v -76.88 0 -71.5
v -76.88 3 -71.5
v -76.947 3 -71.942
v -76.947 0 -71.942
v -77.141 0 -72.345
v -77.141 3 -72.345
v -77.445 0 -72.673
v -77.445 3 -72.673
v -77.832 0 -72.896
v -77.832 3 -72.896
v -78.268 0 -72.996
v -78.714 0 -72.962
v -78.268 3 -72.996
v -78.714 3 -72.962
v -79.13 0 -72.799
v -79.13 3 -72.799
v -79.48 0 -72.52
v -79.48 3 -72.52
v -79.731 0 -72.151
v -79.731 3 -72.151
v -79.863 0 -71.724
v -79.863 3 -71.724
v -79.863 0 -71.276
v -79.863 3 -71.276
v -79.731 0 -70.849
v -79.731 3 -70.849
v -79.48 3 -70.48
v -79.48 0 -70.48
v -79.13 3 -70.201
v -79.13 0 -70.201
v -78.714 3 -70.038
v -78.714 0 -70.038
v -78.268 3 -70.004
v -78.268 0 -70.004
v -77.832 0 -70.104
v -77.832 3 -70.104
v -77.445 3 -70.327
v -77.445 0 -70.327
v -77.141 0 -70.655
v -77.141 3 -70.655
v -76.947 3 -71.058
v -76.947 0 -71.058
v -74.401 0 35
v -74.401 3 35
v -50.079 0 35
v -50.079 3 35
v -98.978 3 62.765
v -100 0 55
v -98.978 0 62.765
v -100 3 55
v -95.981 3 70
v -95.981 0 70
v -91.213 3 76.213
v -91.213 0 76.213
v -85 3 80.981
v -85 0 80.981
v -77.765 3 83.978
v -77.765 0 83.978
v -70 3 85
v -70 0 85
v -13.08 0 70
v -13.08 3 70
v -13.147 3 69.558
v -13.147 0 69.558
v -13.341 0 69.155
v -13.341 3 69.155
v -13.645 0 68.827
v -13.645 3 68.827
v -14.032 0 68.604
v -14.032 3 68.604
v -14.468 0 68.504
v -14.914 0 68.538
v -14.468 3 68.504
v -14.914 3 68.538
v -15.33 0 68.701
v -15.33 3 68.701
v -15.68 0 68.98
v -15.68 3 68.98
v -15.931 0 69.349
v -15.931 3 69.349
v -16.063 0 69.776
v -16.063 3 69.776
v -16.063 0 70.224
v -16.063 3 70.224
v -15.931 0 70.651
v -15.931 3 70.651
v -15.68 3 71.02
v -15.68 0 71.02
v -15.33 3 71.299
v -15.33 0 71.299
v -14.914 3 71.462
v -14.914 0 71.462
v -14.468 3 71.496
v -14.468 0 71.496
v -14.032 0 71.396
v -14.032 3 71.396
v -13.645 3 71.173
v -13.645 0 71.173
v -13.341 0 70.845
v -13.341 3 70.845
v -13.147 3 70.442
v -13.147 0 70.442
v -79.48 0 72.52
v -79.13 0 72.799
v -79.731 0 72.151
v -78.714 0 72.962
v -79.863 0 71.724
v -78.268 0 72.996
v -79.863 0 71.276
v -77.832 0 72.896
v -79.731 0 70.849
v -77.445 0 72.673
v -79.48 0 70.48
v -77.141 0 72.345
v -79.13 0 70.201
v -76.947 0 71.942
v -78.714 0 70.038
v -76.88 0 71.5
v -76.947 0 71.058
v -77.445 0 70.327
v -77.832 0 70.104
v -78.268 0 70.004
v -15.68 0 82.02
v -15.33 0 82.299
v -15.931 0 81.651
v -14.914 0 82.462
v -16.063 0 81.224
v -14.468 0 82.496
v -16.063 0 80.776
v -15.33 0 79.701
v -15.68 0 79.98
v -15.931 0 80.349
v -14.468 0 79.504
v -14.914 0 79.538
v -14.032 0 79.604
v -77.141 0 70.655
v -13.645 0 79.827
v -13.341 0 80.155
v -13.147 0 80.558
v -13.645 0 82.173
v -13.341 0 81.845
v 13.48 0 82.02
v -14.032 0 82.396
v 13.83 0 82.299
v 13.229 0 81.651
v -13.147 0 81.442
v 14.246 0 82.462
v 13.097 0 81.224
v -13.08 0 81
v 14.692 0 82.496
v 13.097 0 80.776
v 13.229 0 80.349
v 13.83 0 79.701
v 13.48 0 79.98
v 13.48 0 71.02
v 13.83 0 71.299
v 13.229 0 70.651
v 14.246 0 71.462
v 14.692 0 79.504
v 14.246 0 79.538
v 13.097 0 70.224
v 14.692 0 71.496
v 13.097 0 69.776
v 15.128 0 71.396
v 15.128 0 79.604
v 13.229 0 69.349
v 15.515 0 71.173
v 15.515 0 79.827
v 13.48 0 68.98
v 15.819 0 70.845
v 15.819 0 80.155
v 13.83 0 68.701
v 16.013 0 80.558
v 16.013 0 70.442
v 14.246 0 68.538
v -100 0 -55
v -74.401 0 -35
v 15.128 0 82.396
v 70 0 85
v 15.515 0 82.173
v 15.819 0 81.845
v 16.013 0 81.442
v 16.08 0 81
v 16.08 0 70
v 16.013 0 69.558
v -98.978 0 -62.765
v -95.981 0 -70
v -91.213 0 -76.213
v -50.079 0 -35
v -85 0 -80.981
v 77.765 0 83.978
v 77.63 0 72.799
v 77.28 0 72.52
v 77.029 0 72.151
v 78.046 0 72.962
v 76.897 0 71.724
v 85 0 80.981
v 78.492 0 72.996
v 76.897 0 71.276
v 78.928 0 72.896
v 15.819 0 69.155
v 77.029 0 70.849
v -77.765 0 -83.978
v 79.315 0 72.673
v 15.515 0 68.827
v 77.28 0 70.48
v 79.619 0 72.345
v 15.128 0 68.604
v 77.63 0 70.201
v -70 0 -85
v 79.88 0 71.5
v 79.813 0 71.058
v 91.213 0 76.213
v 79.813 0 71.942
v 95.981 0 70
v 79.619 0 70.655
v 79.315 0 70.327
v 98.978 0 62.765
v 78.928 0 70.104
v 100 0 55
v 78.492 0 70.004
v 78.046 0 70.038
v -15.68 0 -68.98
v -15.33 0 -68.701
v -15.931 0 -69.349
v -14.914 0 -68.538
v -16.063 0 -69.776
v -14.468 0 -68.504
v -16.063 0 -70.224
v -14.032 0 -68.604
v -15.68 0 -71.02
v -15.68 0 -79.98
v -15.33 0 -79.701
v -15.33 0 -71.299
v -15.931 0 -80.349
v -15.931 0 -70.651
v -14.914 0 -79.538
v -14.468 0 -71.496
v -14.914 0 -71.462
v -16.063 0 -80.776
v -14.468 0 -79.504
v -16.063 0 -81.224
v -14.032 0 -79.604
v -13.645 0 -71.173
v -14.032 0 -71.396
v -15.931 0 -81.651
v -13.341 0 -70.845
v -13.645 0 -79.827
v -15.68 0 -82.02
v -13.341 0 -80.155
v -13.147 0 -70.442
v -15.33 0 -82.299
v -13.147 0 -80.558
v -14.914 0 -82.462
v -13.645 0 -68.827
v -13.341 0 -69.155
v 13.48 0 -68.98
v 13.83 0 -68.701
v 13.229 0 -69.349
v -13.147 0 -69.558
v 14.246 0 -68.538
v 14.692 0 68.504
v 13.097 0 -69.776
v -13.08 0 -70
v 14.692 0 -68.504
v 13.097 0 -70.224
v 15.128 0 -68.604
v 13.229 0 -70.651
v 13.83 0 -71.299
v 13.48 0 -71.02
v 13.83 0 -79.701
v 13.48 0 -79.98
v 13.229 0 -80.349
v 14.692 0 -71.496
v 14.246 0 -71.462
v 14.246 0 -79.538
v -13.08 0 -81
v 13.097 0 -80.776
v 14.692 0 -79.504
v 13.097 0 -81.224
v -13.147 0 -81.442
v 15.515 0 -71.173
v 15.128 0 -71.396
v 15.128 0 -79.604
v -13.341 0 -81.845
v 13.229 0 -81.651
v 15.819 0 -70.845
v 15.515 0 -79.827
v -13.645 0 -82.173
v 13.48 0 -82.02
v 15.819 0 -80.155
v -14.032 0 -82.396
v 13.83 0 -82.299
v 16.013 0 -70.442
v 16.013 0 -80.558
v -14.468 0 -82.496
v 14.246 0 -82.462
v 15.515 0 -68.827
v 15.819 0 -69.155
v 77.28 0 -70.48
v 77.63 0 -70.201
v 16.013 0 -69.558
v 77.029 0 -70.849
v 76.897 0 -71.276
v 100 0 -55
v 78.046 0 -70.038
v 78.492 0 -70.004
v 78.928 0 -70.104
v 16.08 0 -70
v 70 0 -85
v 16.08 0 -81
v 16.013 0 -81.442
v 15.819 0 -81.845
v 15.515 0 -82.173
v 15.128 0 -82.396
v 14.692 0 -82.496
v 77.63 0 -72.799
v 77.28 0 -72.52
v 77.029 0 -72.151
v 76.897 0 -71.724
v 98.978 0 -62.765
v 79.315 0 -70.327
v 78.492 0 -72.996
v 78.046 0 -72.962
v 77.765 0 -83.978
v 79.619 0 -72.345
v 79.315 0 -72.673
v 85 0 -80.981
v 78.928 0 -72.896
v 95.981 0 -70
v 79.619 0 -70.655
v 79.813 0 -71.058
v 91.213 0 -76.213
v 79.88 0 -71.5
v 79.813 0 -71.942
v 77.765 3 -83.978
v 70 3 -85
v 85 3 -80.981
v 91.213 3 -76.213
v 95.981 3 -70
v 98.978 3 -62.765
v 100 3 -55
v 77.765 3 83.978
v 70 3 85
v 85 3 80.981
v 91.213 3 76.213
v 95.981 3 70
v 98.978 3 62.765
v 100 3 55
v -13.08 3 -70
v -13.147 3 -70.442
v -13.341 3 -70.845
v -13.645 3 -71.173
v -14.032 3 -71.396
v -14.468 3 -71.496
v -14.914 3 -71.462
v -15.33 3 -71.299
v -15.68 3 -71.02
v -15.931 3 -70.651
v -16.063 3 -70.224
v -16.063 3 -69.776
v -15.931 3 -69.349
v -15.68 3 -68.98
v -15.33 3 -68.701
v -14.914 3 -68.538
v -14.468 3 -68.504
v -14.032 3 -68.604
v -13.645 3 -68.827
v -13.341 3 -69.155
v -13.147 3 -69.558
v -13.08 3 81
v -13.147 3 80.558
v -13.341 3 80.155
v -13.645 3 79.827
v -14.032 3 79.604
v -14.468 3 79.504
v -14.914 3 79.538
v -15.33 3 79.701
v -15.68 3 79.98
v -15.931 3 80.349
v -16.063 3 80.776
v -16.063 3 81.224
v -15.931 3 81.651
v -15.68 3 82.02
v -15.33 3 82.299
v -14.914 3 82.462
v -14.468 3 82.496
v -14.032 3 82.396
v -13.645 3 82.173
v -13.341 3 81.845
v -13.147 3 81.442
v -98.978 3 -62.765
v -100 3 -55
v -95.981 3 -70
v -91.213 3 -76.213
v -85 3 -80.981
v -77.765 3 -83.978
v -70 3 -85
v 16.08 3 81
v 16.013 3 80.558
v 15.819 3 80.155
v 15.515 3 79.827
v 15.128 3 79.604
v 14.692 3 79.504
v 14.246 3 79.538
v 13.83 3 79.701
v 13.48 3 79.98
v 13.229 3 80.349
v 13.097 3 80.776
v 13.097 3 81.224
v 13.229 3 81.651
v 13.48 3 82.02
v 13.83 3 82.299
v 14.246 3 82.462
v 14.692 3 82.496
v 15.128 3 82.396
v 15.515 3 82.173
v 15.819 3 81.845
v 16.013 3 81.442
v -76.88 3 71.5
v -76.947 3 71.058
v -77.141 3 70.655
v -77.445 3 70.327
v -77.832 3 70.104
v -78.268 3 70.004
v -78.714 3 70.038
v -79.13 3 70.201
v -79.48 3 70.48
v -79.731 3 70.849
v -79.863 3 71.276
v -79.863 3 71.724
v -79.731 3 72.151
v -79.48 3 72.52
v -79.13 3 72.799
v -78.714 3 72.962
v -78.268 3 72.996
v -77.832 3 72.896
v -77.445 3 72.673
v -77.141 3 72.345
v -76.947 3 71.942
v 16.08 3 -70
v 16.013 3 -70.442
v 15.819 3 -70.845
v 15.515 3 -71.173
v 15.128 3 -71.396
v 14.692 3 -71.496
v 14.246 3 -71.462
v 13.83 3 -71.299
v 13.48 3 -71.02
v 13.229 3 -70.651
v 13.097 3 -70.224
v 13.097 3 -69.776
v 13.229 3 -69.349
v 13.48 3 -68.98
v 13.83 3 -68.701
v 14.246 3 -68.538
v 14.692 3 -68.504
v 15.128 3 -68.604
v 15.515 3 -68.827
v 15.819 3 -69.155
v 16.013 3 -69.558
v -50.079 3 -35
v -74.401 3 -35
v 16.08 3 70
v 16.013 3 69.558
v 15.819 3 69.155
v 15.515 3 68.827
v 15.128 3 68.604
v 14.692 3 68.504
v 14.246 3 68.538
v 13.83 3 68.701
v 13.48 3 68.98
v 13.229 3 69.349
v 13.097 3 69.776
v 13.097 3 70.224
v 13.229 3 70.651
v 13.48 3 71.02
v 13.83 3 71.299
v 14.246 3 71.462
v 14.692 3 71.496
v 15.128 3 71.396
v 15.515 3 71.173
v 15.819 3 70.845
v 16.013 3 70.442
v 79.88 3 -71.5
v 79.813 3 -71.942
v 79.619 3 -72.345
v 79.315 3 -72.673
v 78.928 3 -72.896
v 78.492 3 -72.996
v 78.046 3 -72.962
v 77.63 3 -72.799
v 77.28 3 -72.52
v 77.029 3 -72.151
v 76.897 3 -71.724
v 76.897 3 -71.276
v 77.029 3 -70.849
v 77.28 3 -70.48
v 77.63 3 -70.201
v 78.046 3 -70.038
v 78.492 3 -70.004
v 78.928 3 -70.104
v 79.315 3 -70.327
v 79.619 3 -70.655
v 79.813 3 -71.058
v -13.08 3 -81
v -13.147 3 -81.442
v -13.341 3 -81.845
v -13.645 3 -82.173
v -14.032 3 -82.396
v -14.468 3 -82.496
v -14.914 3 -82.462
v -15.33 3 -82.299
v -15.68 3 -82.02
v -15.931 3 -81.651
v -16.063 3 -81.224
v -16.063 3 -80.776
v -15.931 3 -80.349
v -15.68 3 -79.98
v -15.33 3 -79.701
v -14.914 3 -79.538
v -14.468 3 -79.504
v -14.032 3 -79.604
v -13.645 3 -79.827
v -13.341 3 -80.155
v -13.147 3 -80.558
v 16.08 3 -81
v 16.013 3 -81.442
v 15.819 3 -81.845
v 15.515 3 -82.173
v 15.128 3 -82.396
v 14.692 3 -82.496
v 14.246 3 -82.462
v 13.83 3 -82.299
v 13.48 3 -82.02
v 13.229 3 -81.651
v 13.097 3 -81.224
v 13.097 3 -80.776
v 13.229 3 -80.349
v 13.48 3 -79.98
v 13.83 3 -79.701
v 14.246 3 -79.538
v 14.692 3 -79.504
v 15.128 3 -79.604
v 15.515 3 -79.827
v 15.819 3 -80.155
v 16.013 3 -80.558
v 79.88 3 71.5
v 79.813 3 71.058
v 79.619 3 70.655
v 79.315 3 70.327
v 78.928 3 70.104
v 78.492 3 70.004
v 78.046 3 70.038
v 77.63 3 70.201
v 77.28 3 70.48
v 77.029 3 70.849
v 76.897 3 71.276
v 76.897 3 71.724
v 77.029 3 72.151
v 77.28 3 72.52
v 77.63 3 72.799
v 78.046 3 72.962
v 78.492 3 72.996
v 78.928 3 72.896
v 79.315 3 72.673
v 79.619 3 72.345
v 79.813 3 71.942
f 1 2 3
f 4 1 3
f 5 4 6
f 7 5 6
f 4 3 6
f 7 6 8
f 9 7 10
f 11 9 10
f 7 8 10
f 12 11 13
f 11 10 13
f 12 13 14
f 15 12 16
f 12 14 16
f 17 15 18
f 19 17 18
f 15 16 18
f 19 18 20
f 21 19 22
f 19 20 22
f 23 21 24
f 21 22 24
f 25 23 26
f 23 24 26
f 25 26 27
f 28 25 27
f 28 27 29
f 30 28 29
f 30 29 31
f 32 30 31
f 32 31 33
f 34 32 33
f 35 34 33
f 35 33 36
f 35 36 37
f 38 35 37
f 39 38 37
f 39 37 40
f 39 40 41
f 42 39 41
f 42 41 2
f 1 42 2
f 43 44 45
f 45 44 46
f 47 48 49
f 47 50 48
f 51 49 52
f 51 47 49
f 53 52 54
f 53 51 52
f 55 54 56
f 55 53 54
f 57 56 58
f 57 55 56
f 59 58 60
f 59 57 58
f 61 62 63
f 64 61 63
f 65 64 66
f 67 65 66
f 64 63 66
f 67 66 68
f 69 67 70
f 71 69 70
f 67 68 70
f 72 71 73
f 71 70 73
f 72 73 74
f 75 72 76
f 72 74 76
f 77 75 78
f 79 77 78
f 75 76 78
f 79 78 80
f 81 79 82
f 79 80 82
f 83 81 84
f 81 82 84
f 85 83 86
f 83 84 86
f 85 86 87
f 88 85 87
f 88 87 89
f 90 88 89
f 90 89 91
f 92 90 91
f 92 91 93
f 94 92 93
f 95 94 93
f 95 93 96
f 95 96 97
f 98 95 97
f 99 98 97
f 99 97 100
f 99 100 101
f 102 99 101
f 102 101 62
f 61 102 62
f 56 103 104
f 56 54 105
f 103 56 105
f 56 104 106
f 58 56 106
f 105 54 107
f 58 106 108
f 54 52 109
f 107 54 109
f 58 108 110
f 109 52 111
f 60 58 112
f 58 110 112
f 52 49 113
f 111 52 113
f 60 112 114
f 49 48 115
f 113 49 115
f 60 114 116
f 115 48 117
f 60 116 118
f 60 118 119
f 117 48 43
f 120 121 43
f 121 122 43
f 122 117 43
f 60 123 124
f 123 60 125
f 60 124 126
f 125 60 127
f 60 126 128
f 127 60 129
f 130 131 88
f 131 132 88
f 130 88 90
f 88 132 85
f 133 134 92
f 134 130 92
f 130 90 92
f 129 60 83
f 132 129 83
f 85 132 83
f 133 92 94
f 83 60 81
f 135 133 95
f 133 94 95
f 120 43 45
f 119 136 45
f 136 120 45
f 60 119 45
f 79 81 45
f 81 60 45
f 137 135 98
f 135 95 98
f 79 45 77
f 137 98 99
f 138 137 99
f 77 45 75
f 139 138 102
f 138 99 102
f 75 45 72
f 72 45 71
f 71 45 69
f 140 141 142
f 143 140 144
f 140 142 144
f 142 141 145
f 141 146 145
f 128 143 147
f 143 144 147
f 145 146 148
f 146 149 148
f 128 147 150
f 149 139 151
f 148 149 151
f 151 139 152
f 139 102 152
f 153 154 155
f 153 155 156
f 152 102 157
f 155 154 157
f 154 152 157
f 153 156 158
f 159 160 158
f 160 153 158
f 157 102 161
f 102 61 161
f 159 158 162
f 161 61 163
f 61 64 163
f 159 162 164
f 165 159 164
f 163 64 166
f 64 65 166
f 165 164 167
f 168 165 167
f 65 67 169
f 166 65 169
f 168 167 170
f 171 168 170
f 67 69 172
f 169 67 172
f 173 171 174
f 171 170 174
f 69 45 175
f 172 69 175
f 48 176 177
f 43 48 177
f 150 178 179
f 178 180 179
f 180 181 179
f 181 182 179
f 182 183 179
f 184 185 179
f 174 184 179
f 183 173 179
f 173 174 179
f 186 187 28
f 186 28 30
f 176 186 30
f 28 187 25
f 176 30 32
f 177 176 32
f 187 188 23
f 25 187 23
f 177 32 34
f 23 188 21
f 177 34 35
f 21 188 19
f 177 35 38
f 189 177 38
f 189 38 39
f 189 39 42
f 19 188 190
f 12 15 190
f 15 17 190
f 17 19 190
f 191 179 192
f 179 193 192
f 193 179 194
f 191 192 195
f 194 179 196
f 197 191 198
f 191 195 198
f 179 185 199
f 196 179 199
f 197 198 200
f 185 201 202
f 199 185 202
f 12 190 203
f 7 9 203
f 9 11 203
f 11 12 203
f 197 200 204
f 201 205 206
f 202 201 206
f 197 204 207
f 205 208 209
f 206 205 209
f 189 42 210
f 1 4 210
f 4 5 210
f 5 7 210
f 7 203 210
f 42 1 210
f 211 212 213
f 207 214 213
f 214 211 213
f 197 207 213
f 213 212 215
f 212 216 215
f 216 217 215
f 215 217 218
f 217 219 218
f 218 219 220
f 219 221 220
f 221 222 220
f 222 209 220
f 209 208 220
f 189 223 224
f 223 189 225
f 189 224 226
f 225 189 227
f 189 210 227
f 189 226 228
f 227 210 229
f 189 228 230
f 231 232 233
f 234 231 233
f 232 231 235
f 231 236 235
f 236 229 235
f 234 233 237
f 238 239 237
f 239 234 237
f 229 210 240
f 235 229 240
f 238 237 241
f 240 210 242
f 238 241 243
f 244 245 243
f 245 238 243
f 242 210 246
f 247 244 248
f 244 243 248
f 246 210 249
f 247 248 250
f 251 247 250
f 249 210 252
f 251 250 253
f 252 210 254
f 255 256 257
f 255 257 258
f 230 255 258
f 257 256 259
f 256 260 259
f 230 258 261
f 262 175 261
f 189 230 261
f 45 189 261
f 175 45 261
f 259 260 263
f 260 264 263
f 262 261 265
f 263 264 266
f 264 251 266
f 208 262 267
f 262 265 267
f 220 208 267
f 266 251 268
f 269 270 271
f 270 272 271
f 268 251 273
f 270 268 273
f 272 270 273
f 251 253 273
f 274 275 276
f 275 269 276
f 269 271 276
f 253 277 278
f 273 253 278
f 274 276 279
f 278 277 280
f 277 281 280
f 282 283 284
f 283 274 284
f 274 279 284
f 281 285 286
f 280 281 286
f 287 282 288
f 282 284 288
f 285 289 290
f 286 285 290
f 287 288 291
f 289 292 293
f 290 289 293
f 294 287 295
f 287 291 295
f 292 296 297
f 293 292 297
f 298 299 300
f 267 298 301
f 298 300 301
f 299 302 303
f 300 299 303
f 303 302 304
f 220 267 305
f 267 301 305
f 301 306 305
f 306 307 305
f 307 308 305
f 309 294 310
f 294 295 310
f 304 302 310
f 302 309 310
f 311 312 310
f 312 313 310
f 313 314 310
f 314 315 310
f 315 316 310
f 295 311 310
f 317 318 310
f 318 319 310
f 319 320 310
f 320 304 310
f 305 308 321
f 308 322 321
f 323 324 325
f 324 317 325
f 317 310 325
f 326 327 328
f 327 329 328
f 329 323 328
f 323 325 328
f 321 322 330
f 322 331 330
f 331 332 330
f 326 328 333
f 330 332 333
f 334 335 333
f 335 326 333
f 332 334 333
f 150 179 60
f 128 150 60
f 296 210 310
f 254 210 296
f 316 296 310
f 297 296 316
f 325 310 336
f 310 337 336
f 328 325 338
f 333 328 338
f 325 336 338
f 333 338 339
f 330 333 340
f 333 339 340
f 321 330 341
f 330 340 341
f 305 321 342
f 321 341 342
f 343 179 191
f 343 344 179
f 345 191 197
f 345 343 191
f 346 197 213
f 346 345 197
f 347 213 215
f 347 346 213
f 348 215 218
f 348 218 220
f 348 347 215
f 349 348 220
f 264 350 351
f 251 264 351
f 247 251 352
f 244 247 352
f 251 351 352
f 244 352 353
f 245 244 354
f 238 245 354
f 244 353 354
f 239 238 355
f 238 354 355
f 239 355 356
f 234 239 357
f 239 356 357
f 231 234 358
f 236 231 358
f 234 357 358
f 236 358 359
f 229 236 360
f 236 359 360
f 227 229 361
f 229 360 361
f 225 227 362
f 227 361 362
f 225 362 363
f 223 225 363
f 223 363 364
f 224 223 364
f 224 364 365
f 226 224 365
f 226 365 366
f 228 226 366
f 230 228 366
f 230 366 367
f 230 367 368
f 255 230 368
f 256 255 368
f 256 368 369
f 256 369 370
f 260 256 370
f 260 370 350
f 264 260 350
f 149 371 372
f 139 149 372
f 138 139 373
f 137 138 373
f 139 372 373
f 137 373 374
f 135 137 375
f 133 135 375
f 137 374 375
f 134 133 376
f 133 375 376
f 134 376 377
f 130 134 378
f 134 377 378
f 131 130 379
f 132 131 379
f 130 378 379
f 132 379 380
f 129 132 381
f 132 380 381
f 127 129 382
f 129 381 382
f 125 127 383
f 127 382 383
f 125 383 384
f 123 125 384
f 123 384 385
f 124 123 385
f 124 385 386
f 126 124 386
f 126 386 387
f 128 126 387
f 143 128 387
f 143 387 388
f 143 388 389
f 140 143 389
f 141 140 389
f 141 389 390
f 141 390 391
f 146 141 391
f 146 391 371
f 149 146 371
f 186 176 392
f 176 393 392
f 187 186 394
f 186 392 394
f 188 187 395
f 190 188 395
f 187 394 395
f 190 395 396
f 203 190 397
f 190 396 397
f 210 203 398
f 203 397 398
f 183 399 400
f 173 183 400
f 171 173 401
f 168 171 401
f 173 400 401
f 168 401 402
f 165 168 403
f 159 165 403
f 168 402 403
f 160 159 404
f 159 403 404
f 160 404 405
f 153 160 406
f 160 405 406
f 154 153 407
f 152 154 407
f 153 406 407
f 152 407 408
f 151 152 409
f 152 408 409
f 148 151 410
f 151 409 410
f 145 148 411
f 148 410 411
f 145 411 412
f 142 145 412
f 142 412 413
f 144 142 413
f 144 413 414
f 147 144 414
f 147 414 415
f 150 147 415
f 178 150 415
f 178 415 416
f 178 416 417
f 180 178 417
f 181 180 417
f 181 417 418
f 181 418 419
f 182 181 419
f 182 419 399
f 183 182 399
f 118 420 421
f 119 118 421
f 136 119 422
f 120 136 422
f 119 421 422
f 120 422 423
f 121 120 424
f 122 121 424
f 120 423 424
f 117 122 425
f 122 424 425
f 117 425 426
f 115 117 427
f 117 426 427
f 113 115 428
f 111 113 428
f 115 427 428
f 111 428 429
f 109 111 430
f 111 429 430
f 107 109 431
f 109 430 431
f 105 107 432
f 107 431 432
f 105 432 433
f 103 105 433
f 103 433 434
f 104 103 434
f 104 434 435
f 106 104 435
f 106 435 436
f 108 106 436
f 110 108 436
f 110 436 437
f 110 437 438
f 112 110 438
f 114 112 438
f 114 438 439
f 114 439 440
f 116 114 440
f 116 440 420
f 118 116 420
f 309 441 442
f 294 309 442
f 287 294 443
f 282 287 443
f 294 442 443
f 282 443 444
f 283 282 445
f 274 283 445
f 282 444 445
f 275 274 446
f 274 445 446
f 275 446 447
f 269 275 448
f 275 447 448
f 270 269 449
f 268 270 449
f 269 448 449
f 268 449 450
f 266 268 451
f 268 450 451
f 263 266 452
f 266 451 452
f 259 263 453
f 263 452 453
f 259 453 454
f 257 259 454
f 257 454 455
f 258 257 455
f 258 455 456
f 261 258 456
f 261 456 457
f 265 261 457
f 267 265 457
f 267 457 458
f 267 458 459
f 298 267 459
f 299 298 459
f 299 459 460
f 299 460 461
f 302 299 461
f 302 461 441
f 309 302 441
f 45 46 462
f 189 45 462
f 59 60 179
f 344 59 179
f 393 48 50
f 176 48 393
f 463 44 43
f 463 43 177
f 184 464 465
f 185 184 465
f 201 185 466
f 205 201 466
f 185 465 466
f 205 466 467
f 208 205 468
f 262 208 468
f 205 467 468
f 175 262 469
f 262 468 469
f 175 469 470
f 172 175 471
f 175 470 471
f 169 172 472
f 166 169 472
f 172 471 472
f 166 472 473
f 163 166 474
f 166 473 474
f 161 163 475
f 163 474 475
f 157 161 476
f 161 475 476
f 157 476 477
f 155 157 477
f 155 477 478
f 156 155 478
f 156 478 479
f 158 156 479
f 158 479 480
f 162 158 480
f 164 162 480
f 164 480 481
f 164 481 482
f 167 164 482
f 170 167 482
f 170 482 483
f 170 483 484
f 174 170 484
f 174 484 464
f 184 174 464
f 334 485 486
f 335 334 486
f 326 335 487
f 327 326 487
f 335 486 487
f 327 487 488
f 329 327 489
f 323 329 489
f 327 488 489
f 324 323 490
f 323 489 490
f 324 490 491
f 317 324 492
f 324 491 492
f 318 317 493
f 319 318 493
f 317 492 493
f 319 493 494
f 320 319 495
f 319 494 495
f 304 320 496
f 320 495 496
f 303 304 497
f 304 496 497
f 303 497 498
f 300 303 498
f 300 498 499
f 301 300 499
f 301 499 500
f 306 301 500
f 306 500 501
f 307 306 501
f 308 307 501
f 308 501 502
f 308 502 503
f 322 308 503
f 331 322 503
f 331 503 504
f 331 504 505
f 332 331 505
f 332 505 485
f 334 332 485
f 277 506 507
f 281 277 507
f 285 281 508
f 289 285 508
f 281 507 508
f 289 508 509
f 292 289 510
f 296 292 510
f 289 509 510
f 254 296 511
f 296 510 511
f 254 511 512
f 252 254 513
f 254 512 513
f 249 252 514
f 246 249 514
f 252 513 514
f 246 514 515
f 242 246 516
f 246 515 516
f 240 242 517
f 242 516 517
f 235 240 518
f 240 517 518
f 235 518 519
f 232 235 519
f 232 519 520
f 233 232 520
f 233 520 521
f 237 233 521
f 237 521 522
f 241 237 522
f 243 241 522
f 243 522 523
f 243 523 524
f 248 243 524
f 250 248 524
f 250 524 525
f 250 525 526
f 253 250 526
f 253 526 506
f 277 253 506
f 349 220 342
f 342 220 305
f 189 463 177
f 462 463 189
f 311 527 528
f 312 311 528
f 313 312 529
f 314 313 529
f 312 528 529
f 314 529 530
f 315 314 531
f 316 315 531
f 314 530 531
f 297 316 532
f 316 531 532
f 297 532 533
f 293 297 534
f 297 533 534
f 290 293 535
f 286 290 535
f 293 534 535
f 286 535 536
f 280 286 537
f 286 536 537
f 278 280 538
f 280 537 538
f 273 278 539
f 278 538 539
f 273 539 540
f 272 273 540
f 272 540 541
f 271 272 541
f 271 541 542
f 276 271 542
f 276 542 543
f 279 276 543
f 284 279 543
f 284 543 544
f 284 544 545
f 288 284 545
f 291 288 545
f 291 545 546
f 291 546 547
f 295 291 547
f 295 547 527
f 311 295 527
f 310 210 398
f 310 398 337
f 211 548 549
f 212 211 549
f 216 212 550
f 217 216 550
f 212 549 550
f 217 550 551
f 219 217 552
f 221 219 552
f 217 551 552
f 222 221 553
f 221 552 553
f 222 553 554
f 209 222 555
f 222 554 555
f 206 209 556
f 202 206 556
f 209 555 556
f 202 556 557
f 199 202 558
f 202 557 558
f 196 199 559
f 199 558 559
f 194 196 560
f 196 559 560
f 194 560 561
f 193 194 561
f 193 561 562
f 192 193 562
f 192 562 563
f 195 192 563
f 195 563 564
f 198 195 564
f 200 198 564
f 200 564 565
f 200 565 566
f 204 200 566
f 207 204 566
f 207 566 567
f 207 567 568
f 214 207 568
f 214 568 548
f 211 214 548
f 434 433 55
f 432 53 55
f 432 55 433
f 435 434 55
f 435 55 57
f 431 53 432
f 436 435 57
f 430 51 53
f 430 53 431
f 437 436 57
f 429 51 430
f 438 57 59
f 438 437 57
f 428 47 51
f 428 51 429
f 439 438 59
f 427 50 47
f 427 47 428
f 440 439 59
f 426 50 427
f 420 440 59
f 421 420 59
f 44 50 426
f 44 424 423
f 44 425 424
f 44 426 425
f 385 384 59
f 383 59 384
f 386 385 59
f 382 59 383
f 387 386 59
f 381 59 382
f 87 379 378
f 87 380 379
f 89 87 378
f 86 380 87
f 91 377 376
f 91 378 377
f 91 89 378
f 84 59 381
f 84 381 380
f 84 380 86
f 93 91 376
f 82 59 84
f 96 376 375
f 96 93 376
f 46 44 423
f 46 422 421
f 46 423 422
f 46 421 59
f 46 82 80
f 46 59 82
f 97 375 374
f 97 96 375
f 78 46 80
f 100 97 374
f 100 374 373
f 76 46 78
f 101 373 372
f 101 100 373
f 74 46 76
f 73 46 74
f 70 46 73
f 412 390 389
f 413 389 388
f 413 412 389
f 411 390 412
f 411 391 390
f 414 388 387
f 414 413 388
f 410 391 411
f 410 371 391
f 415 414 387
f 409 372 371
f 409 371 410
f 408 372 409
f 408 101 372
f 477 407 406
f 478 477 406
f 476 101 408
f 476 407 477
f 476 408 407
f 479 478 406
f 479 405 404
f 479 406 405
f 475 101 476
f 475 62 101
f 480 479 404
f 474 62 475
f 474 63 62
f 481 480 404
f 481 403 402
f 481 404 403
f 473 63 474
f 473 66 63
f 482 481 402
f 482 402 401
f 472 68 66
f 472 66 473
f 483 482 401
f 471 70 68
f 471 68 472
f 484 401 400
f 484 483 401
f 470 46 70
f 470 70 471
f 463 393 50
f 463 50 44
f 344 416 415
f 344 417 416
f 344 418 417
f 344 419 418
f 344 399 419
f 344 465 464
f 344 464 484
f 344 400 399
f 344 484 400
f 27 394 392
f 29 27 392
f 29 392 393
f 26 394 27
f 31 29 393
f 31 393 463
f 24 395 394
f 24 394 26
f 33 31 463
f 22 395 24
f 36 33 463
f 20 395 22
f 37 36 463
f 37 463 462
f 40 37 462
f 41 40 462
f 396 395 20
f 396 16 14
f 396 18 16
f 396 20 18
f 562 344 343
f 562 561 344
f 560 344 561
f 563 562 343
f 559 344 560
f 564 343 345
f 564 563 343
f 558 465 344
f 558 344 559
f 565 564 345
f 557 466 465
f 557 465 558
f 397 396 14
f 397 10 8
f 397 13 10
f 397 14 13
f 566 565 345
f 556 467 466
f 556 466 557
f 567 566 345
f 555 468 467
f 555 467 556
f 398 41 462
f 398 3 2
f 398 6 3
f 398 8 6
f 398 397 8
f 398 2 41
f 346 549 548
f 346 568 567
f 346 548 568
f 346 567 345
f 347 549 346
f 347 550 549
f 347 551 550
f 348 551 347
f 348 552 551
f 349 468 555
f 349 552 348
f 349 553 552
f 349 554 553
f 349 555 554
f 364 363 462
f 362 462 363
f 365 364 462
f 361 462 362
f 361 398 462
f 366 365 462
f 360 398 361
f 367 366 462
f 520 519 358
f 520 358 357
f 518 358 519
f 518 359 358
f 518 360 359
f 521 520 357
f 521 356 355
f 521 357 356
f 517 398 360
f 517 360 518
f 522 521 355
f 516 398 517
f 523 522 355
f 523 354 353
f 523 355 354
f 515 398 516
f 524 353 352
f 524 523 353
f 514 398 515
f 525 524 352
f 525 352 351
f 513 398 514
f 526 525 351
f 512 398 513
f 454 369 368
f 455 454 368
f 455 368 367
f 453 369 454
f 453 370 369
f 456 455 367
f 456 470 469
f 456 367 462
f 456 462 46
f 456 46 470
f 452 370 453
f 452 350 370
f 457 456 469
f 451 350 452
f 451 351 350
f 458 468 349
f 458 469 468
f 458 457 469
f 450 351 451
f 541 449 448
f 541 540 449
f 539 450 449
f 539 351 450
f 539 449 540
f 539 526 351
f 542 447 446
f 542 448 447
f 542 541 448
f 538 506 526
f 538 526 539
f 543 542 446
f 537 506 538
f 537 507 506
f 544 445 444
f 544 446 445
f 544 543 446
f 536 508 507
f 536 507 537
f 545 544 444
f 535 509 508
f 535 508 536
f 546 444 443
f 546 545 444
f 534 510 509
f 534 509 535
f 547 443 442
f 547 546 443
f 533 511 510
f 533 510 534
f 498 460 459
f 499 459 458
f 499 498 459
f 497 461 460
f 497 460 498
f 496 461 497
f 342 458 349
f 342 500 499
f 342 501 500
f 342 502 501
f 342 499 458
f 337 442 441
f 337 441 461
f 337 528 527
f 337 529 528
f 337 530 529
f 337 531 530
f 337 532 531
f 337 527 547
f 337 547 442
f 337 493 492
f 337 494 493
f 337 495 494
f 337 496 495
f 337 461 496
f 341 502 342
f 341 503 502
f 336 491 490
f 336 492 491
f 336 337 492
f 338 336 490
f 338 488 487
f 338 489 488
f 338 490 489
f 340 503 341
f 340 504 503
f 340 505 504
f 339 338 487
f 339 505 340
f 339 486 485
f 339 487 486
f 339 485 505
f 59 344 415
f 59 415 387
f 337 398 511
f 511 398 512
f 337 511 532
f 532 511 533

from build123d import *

# Parameters (mm, degrees)
SKETCH1_W           = 200
SKETCH1_H           = 170
BOSS_EXTRUDE1_DEPTH = 3
SKETCH2_W           = 24.321835298
SKETCH2_H           = 70
CUT_EXTRUDE1_DEPTH  = 100
SKETCH3_R           = 1.5
CUT_EXTRUDE2_DEPTH  = 100
SKETCH4_R           = 1.5
CUT_EXTRUDE3_DEPTH  = 100
FILLET1_R           = 30


with BuildPart() as part:
    # Sketch1 → Boss-Extrude1 (new body)
    with BuildSketch(Plane(origin=(0, 0, 0), x_dir=(1, 0, 0), z_dir=(0, 1, 0))):
        Rectangle(SKETCH1_W, SKETCH1_H)
    extrude(amount=BOSS_EXTRUDE1_DEPTH)

    # Sketch2 → Cut-Extrude1 (cut)
    with BuildSketch(Plane(origin=(0, 3, 0), x_dir=(1, 0, 0), z_dir=(0, 1, 0))):
        with Locations((-62.239691906, 0)):
            Rectangle(SKETCH2_W, SKETCH2_H)
    extrude(amount=-CUT_EXTRUDE1_DEPTH, mode=Mode.SUBTRACT)

    # Sketch3 → Cut-Extrude2 (cut)
    with BuildSketch(Plane(origin=(0, 3, 0), x_dir=(1, 0, 0), z_dir=(0, 1, 0))):
        with Locations((-78.38, -71.5)):
            Circle(SKETCH3_R)
        with Locations((-78.38, 71.5)):
            Circle(SKETCH3_R)
        with Locations((78.38, 71.5)):
            Circle(SKETCH3_R)
        with Locations((78.38, -71.5)):
            Circle(SKETCH3_R)
    extrude(amount=-CUT_EXTRUDE2_DEPTH, mode=Mode.SUBTRACT)

    # Sketch4 → Cut-Extrude3 (cut)
    with BuildSketch(Plane(origin=(0, 3, 0), x_dir=(1, 0, 0), z_dir=(0, 1, 0))):
        with Locations((-14.58, -81)):
            Circle(SKETCH4_R)
        with Locations((14.58, -81)):
            Circle(SKETCH4_R)
        with Locations((-14.58, -70)):
            Circle(SKETCH4_R)
        with Locations((14.58, -70)):
            Circle(SKETCH4_R)
        with Locations((-14.58, 81)):
            Circle(SKETCH4_R)
        with Locations((-14.58, 70)):
            Circle(SKETCH4_R)
        with Locations((14.58, 81)):
            Circle(SKETCH4_R)
        with Locations((14.58, 70)):
            Circle(SKETCH4_R)
    extrude(amount=-CUT_EXTRUDE3_DEPTH, mode=Mode.SUBTRACT)

    # Fillet1
    fillet1_edges = [part.edges().sort_by_distance(p)[0] for p in [
        (100, 1.5, 85),
        (-100, 1.5, 85),
        (-100, 1.5, -85),
        (100, 1.5, -85),
    ]]
    fillet(fillet1_edges, radius=FILLET1_R)


solid = part.part
